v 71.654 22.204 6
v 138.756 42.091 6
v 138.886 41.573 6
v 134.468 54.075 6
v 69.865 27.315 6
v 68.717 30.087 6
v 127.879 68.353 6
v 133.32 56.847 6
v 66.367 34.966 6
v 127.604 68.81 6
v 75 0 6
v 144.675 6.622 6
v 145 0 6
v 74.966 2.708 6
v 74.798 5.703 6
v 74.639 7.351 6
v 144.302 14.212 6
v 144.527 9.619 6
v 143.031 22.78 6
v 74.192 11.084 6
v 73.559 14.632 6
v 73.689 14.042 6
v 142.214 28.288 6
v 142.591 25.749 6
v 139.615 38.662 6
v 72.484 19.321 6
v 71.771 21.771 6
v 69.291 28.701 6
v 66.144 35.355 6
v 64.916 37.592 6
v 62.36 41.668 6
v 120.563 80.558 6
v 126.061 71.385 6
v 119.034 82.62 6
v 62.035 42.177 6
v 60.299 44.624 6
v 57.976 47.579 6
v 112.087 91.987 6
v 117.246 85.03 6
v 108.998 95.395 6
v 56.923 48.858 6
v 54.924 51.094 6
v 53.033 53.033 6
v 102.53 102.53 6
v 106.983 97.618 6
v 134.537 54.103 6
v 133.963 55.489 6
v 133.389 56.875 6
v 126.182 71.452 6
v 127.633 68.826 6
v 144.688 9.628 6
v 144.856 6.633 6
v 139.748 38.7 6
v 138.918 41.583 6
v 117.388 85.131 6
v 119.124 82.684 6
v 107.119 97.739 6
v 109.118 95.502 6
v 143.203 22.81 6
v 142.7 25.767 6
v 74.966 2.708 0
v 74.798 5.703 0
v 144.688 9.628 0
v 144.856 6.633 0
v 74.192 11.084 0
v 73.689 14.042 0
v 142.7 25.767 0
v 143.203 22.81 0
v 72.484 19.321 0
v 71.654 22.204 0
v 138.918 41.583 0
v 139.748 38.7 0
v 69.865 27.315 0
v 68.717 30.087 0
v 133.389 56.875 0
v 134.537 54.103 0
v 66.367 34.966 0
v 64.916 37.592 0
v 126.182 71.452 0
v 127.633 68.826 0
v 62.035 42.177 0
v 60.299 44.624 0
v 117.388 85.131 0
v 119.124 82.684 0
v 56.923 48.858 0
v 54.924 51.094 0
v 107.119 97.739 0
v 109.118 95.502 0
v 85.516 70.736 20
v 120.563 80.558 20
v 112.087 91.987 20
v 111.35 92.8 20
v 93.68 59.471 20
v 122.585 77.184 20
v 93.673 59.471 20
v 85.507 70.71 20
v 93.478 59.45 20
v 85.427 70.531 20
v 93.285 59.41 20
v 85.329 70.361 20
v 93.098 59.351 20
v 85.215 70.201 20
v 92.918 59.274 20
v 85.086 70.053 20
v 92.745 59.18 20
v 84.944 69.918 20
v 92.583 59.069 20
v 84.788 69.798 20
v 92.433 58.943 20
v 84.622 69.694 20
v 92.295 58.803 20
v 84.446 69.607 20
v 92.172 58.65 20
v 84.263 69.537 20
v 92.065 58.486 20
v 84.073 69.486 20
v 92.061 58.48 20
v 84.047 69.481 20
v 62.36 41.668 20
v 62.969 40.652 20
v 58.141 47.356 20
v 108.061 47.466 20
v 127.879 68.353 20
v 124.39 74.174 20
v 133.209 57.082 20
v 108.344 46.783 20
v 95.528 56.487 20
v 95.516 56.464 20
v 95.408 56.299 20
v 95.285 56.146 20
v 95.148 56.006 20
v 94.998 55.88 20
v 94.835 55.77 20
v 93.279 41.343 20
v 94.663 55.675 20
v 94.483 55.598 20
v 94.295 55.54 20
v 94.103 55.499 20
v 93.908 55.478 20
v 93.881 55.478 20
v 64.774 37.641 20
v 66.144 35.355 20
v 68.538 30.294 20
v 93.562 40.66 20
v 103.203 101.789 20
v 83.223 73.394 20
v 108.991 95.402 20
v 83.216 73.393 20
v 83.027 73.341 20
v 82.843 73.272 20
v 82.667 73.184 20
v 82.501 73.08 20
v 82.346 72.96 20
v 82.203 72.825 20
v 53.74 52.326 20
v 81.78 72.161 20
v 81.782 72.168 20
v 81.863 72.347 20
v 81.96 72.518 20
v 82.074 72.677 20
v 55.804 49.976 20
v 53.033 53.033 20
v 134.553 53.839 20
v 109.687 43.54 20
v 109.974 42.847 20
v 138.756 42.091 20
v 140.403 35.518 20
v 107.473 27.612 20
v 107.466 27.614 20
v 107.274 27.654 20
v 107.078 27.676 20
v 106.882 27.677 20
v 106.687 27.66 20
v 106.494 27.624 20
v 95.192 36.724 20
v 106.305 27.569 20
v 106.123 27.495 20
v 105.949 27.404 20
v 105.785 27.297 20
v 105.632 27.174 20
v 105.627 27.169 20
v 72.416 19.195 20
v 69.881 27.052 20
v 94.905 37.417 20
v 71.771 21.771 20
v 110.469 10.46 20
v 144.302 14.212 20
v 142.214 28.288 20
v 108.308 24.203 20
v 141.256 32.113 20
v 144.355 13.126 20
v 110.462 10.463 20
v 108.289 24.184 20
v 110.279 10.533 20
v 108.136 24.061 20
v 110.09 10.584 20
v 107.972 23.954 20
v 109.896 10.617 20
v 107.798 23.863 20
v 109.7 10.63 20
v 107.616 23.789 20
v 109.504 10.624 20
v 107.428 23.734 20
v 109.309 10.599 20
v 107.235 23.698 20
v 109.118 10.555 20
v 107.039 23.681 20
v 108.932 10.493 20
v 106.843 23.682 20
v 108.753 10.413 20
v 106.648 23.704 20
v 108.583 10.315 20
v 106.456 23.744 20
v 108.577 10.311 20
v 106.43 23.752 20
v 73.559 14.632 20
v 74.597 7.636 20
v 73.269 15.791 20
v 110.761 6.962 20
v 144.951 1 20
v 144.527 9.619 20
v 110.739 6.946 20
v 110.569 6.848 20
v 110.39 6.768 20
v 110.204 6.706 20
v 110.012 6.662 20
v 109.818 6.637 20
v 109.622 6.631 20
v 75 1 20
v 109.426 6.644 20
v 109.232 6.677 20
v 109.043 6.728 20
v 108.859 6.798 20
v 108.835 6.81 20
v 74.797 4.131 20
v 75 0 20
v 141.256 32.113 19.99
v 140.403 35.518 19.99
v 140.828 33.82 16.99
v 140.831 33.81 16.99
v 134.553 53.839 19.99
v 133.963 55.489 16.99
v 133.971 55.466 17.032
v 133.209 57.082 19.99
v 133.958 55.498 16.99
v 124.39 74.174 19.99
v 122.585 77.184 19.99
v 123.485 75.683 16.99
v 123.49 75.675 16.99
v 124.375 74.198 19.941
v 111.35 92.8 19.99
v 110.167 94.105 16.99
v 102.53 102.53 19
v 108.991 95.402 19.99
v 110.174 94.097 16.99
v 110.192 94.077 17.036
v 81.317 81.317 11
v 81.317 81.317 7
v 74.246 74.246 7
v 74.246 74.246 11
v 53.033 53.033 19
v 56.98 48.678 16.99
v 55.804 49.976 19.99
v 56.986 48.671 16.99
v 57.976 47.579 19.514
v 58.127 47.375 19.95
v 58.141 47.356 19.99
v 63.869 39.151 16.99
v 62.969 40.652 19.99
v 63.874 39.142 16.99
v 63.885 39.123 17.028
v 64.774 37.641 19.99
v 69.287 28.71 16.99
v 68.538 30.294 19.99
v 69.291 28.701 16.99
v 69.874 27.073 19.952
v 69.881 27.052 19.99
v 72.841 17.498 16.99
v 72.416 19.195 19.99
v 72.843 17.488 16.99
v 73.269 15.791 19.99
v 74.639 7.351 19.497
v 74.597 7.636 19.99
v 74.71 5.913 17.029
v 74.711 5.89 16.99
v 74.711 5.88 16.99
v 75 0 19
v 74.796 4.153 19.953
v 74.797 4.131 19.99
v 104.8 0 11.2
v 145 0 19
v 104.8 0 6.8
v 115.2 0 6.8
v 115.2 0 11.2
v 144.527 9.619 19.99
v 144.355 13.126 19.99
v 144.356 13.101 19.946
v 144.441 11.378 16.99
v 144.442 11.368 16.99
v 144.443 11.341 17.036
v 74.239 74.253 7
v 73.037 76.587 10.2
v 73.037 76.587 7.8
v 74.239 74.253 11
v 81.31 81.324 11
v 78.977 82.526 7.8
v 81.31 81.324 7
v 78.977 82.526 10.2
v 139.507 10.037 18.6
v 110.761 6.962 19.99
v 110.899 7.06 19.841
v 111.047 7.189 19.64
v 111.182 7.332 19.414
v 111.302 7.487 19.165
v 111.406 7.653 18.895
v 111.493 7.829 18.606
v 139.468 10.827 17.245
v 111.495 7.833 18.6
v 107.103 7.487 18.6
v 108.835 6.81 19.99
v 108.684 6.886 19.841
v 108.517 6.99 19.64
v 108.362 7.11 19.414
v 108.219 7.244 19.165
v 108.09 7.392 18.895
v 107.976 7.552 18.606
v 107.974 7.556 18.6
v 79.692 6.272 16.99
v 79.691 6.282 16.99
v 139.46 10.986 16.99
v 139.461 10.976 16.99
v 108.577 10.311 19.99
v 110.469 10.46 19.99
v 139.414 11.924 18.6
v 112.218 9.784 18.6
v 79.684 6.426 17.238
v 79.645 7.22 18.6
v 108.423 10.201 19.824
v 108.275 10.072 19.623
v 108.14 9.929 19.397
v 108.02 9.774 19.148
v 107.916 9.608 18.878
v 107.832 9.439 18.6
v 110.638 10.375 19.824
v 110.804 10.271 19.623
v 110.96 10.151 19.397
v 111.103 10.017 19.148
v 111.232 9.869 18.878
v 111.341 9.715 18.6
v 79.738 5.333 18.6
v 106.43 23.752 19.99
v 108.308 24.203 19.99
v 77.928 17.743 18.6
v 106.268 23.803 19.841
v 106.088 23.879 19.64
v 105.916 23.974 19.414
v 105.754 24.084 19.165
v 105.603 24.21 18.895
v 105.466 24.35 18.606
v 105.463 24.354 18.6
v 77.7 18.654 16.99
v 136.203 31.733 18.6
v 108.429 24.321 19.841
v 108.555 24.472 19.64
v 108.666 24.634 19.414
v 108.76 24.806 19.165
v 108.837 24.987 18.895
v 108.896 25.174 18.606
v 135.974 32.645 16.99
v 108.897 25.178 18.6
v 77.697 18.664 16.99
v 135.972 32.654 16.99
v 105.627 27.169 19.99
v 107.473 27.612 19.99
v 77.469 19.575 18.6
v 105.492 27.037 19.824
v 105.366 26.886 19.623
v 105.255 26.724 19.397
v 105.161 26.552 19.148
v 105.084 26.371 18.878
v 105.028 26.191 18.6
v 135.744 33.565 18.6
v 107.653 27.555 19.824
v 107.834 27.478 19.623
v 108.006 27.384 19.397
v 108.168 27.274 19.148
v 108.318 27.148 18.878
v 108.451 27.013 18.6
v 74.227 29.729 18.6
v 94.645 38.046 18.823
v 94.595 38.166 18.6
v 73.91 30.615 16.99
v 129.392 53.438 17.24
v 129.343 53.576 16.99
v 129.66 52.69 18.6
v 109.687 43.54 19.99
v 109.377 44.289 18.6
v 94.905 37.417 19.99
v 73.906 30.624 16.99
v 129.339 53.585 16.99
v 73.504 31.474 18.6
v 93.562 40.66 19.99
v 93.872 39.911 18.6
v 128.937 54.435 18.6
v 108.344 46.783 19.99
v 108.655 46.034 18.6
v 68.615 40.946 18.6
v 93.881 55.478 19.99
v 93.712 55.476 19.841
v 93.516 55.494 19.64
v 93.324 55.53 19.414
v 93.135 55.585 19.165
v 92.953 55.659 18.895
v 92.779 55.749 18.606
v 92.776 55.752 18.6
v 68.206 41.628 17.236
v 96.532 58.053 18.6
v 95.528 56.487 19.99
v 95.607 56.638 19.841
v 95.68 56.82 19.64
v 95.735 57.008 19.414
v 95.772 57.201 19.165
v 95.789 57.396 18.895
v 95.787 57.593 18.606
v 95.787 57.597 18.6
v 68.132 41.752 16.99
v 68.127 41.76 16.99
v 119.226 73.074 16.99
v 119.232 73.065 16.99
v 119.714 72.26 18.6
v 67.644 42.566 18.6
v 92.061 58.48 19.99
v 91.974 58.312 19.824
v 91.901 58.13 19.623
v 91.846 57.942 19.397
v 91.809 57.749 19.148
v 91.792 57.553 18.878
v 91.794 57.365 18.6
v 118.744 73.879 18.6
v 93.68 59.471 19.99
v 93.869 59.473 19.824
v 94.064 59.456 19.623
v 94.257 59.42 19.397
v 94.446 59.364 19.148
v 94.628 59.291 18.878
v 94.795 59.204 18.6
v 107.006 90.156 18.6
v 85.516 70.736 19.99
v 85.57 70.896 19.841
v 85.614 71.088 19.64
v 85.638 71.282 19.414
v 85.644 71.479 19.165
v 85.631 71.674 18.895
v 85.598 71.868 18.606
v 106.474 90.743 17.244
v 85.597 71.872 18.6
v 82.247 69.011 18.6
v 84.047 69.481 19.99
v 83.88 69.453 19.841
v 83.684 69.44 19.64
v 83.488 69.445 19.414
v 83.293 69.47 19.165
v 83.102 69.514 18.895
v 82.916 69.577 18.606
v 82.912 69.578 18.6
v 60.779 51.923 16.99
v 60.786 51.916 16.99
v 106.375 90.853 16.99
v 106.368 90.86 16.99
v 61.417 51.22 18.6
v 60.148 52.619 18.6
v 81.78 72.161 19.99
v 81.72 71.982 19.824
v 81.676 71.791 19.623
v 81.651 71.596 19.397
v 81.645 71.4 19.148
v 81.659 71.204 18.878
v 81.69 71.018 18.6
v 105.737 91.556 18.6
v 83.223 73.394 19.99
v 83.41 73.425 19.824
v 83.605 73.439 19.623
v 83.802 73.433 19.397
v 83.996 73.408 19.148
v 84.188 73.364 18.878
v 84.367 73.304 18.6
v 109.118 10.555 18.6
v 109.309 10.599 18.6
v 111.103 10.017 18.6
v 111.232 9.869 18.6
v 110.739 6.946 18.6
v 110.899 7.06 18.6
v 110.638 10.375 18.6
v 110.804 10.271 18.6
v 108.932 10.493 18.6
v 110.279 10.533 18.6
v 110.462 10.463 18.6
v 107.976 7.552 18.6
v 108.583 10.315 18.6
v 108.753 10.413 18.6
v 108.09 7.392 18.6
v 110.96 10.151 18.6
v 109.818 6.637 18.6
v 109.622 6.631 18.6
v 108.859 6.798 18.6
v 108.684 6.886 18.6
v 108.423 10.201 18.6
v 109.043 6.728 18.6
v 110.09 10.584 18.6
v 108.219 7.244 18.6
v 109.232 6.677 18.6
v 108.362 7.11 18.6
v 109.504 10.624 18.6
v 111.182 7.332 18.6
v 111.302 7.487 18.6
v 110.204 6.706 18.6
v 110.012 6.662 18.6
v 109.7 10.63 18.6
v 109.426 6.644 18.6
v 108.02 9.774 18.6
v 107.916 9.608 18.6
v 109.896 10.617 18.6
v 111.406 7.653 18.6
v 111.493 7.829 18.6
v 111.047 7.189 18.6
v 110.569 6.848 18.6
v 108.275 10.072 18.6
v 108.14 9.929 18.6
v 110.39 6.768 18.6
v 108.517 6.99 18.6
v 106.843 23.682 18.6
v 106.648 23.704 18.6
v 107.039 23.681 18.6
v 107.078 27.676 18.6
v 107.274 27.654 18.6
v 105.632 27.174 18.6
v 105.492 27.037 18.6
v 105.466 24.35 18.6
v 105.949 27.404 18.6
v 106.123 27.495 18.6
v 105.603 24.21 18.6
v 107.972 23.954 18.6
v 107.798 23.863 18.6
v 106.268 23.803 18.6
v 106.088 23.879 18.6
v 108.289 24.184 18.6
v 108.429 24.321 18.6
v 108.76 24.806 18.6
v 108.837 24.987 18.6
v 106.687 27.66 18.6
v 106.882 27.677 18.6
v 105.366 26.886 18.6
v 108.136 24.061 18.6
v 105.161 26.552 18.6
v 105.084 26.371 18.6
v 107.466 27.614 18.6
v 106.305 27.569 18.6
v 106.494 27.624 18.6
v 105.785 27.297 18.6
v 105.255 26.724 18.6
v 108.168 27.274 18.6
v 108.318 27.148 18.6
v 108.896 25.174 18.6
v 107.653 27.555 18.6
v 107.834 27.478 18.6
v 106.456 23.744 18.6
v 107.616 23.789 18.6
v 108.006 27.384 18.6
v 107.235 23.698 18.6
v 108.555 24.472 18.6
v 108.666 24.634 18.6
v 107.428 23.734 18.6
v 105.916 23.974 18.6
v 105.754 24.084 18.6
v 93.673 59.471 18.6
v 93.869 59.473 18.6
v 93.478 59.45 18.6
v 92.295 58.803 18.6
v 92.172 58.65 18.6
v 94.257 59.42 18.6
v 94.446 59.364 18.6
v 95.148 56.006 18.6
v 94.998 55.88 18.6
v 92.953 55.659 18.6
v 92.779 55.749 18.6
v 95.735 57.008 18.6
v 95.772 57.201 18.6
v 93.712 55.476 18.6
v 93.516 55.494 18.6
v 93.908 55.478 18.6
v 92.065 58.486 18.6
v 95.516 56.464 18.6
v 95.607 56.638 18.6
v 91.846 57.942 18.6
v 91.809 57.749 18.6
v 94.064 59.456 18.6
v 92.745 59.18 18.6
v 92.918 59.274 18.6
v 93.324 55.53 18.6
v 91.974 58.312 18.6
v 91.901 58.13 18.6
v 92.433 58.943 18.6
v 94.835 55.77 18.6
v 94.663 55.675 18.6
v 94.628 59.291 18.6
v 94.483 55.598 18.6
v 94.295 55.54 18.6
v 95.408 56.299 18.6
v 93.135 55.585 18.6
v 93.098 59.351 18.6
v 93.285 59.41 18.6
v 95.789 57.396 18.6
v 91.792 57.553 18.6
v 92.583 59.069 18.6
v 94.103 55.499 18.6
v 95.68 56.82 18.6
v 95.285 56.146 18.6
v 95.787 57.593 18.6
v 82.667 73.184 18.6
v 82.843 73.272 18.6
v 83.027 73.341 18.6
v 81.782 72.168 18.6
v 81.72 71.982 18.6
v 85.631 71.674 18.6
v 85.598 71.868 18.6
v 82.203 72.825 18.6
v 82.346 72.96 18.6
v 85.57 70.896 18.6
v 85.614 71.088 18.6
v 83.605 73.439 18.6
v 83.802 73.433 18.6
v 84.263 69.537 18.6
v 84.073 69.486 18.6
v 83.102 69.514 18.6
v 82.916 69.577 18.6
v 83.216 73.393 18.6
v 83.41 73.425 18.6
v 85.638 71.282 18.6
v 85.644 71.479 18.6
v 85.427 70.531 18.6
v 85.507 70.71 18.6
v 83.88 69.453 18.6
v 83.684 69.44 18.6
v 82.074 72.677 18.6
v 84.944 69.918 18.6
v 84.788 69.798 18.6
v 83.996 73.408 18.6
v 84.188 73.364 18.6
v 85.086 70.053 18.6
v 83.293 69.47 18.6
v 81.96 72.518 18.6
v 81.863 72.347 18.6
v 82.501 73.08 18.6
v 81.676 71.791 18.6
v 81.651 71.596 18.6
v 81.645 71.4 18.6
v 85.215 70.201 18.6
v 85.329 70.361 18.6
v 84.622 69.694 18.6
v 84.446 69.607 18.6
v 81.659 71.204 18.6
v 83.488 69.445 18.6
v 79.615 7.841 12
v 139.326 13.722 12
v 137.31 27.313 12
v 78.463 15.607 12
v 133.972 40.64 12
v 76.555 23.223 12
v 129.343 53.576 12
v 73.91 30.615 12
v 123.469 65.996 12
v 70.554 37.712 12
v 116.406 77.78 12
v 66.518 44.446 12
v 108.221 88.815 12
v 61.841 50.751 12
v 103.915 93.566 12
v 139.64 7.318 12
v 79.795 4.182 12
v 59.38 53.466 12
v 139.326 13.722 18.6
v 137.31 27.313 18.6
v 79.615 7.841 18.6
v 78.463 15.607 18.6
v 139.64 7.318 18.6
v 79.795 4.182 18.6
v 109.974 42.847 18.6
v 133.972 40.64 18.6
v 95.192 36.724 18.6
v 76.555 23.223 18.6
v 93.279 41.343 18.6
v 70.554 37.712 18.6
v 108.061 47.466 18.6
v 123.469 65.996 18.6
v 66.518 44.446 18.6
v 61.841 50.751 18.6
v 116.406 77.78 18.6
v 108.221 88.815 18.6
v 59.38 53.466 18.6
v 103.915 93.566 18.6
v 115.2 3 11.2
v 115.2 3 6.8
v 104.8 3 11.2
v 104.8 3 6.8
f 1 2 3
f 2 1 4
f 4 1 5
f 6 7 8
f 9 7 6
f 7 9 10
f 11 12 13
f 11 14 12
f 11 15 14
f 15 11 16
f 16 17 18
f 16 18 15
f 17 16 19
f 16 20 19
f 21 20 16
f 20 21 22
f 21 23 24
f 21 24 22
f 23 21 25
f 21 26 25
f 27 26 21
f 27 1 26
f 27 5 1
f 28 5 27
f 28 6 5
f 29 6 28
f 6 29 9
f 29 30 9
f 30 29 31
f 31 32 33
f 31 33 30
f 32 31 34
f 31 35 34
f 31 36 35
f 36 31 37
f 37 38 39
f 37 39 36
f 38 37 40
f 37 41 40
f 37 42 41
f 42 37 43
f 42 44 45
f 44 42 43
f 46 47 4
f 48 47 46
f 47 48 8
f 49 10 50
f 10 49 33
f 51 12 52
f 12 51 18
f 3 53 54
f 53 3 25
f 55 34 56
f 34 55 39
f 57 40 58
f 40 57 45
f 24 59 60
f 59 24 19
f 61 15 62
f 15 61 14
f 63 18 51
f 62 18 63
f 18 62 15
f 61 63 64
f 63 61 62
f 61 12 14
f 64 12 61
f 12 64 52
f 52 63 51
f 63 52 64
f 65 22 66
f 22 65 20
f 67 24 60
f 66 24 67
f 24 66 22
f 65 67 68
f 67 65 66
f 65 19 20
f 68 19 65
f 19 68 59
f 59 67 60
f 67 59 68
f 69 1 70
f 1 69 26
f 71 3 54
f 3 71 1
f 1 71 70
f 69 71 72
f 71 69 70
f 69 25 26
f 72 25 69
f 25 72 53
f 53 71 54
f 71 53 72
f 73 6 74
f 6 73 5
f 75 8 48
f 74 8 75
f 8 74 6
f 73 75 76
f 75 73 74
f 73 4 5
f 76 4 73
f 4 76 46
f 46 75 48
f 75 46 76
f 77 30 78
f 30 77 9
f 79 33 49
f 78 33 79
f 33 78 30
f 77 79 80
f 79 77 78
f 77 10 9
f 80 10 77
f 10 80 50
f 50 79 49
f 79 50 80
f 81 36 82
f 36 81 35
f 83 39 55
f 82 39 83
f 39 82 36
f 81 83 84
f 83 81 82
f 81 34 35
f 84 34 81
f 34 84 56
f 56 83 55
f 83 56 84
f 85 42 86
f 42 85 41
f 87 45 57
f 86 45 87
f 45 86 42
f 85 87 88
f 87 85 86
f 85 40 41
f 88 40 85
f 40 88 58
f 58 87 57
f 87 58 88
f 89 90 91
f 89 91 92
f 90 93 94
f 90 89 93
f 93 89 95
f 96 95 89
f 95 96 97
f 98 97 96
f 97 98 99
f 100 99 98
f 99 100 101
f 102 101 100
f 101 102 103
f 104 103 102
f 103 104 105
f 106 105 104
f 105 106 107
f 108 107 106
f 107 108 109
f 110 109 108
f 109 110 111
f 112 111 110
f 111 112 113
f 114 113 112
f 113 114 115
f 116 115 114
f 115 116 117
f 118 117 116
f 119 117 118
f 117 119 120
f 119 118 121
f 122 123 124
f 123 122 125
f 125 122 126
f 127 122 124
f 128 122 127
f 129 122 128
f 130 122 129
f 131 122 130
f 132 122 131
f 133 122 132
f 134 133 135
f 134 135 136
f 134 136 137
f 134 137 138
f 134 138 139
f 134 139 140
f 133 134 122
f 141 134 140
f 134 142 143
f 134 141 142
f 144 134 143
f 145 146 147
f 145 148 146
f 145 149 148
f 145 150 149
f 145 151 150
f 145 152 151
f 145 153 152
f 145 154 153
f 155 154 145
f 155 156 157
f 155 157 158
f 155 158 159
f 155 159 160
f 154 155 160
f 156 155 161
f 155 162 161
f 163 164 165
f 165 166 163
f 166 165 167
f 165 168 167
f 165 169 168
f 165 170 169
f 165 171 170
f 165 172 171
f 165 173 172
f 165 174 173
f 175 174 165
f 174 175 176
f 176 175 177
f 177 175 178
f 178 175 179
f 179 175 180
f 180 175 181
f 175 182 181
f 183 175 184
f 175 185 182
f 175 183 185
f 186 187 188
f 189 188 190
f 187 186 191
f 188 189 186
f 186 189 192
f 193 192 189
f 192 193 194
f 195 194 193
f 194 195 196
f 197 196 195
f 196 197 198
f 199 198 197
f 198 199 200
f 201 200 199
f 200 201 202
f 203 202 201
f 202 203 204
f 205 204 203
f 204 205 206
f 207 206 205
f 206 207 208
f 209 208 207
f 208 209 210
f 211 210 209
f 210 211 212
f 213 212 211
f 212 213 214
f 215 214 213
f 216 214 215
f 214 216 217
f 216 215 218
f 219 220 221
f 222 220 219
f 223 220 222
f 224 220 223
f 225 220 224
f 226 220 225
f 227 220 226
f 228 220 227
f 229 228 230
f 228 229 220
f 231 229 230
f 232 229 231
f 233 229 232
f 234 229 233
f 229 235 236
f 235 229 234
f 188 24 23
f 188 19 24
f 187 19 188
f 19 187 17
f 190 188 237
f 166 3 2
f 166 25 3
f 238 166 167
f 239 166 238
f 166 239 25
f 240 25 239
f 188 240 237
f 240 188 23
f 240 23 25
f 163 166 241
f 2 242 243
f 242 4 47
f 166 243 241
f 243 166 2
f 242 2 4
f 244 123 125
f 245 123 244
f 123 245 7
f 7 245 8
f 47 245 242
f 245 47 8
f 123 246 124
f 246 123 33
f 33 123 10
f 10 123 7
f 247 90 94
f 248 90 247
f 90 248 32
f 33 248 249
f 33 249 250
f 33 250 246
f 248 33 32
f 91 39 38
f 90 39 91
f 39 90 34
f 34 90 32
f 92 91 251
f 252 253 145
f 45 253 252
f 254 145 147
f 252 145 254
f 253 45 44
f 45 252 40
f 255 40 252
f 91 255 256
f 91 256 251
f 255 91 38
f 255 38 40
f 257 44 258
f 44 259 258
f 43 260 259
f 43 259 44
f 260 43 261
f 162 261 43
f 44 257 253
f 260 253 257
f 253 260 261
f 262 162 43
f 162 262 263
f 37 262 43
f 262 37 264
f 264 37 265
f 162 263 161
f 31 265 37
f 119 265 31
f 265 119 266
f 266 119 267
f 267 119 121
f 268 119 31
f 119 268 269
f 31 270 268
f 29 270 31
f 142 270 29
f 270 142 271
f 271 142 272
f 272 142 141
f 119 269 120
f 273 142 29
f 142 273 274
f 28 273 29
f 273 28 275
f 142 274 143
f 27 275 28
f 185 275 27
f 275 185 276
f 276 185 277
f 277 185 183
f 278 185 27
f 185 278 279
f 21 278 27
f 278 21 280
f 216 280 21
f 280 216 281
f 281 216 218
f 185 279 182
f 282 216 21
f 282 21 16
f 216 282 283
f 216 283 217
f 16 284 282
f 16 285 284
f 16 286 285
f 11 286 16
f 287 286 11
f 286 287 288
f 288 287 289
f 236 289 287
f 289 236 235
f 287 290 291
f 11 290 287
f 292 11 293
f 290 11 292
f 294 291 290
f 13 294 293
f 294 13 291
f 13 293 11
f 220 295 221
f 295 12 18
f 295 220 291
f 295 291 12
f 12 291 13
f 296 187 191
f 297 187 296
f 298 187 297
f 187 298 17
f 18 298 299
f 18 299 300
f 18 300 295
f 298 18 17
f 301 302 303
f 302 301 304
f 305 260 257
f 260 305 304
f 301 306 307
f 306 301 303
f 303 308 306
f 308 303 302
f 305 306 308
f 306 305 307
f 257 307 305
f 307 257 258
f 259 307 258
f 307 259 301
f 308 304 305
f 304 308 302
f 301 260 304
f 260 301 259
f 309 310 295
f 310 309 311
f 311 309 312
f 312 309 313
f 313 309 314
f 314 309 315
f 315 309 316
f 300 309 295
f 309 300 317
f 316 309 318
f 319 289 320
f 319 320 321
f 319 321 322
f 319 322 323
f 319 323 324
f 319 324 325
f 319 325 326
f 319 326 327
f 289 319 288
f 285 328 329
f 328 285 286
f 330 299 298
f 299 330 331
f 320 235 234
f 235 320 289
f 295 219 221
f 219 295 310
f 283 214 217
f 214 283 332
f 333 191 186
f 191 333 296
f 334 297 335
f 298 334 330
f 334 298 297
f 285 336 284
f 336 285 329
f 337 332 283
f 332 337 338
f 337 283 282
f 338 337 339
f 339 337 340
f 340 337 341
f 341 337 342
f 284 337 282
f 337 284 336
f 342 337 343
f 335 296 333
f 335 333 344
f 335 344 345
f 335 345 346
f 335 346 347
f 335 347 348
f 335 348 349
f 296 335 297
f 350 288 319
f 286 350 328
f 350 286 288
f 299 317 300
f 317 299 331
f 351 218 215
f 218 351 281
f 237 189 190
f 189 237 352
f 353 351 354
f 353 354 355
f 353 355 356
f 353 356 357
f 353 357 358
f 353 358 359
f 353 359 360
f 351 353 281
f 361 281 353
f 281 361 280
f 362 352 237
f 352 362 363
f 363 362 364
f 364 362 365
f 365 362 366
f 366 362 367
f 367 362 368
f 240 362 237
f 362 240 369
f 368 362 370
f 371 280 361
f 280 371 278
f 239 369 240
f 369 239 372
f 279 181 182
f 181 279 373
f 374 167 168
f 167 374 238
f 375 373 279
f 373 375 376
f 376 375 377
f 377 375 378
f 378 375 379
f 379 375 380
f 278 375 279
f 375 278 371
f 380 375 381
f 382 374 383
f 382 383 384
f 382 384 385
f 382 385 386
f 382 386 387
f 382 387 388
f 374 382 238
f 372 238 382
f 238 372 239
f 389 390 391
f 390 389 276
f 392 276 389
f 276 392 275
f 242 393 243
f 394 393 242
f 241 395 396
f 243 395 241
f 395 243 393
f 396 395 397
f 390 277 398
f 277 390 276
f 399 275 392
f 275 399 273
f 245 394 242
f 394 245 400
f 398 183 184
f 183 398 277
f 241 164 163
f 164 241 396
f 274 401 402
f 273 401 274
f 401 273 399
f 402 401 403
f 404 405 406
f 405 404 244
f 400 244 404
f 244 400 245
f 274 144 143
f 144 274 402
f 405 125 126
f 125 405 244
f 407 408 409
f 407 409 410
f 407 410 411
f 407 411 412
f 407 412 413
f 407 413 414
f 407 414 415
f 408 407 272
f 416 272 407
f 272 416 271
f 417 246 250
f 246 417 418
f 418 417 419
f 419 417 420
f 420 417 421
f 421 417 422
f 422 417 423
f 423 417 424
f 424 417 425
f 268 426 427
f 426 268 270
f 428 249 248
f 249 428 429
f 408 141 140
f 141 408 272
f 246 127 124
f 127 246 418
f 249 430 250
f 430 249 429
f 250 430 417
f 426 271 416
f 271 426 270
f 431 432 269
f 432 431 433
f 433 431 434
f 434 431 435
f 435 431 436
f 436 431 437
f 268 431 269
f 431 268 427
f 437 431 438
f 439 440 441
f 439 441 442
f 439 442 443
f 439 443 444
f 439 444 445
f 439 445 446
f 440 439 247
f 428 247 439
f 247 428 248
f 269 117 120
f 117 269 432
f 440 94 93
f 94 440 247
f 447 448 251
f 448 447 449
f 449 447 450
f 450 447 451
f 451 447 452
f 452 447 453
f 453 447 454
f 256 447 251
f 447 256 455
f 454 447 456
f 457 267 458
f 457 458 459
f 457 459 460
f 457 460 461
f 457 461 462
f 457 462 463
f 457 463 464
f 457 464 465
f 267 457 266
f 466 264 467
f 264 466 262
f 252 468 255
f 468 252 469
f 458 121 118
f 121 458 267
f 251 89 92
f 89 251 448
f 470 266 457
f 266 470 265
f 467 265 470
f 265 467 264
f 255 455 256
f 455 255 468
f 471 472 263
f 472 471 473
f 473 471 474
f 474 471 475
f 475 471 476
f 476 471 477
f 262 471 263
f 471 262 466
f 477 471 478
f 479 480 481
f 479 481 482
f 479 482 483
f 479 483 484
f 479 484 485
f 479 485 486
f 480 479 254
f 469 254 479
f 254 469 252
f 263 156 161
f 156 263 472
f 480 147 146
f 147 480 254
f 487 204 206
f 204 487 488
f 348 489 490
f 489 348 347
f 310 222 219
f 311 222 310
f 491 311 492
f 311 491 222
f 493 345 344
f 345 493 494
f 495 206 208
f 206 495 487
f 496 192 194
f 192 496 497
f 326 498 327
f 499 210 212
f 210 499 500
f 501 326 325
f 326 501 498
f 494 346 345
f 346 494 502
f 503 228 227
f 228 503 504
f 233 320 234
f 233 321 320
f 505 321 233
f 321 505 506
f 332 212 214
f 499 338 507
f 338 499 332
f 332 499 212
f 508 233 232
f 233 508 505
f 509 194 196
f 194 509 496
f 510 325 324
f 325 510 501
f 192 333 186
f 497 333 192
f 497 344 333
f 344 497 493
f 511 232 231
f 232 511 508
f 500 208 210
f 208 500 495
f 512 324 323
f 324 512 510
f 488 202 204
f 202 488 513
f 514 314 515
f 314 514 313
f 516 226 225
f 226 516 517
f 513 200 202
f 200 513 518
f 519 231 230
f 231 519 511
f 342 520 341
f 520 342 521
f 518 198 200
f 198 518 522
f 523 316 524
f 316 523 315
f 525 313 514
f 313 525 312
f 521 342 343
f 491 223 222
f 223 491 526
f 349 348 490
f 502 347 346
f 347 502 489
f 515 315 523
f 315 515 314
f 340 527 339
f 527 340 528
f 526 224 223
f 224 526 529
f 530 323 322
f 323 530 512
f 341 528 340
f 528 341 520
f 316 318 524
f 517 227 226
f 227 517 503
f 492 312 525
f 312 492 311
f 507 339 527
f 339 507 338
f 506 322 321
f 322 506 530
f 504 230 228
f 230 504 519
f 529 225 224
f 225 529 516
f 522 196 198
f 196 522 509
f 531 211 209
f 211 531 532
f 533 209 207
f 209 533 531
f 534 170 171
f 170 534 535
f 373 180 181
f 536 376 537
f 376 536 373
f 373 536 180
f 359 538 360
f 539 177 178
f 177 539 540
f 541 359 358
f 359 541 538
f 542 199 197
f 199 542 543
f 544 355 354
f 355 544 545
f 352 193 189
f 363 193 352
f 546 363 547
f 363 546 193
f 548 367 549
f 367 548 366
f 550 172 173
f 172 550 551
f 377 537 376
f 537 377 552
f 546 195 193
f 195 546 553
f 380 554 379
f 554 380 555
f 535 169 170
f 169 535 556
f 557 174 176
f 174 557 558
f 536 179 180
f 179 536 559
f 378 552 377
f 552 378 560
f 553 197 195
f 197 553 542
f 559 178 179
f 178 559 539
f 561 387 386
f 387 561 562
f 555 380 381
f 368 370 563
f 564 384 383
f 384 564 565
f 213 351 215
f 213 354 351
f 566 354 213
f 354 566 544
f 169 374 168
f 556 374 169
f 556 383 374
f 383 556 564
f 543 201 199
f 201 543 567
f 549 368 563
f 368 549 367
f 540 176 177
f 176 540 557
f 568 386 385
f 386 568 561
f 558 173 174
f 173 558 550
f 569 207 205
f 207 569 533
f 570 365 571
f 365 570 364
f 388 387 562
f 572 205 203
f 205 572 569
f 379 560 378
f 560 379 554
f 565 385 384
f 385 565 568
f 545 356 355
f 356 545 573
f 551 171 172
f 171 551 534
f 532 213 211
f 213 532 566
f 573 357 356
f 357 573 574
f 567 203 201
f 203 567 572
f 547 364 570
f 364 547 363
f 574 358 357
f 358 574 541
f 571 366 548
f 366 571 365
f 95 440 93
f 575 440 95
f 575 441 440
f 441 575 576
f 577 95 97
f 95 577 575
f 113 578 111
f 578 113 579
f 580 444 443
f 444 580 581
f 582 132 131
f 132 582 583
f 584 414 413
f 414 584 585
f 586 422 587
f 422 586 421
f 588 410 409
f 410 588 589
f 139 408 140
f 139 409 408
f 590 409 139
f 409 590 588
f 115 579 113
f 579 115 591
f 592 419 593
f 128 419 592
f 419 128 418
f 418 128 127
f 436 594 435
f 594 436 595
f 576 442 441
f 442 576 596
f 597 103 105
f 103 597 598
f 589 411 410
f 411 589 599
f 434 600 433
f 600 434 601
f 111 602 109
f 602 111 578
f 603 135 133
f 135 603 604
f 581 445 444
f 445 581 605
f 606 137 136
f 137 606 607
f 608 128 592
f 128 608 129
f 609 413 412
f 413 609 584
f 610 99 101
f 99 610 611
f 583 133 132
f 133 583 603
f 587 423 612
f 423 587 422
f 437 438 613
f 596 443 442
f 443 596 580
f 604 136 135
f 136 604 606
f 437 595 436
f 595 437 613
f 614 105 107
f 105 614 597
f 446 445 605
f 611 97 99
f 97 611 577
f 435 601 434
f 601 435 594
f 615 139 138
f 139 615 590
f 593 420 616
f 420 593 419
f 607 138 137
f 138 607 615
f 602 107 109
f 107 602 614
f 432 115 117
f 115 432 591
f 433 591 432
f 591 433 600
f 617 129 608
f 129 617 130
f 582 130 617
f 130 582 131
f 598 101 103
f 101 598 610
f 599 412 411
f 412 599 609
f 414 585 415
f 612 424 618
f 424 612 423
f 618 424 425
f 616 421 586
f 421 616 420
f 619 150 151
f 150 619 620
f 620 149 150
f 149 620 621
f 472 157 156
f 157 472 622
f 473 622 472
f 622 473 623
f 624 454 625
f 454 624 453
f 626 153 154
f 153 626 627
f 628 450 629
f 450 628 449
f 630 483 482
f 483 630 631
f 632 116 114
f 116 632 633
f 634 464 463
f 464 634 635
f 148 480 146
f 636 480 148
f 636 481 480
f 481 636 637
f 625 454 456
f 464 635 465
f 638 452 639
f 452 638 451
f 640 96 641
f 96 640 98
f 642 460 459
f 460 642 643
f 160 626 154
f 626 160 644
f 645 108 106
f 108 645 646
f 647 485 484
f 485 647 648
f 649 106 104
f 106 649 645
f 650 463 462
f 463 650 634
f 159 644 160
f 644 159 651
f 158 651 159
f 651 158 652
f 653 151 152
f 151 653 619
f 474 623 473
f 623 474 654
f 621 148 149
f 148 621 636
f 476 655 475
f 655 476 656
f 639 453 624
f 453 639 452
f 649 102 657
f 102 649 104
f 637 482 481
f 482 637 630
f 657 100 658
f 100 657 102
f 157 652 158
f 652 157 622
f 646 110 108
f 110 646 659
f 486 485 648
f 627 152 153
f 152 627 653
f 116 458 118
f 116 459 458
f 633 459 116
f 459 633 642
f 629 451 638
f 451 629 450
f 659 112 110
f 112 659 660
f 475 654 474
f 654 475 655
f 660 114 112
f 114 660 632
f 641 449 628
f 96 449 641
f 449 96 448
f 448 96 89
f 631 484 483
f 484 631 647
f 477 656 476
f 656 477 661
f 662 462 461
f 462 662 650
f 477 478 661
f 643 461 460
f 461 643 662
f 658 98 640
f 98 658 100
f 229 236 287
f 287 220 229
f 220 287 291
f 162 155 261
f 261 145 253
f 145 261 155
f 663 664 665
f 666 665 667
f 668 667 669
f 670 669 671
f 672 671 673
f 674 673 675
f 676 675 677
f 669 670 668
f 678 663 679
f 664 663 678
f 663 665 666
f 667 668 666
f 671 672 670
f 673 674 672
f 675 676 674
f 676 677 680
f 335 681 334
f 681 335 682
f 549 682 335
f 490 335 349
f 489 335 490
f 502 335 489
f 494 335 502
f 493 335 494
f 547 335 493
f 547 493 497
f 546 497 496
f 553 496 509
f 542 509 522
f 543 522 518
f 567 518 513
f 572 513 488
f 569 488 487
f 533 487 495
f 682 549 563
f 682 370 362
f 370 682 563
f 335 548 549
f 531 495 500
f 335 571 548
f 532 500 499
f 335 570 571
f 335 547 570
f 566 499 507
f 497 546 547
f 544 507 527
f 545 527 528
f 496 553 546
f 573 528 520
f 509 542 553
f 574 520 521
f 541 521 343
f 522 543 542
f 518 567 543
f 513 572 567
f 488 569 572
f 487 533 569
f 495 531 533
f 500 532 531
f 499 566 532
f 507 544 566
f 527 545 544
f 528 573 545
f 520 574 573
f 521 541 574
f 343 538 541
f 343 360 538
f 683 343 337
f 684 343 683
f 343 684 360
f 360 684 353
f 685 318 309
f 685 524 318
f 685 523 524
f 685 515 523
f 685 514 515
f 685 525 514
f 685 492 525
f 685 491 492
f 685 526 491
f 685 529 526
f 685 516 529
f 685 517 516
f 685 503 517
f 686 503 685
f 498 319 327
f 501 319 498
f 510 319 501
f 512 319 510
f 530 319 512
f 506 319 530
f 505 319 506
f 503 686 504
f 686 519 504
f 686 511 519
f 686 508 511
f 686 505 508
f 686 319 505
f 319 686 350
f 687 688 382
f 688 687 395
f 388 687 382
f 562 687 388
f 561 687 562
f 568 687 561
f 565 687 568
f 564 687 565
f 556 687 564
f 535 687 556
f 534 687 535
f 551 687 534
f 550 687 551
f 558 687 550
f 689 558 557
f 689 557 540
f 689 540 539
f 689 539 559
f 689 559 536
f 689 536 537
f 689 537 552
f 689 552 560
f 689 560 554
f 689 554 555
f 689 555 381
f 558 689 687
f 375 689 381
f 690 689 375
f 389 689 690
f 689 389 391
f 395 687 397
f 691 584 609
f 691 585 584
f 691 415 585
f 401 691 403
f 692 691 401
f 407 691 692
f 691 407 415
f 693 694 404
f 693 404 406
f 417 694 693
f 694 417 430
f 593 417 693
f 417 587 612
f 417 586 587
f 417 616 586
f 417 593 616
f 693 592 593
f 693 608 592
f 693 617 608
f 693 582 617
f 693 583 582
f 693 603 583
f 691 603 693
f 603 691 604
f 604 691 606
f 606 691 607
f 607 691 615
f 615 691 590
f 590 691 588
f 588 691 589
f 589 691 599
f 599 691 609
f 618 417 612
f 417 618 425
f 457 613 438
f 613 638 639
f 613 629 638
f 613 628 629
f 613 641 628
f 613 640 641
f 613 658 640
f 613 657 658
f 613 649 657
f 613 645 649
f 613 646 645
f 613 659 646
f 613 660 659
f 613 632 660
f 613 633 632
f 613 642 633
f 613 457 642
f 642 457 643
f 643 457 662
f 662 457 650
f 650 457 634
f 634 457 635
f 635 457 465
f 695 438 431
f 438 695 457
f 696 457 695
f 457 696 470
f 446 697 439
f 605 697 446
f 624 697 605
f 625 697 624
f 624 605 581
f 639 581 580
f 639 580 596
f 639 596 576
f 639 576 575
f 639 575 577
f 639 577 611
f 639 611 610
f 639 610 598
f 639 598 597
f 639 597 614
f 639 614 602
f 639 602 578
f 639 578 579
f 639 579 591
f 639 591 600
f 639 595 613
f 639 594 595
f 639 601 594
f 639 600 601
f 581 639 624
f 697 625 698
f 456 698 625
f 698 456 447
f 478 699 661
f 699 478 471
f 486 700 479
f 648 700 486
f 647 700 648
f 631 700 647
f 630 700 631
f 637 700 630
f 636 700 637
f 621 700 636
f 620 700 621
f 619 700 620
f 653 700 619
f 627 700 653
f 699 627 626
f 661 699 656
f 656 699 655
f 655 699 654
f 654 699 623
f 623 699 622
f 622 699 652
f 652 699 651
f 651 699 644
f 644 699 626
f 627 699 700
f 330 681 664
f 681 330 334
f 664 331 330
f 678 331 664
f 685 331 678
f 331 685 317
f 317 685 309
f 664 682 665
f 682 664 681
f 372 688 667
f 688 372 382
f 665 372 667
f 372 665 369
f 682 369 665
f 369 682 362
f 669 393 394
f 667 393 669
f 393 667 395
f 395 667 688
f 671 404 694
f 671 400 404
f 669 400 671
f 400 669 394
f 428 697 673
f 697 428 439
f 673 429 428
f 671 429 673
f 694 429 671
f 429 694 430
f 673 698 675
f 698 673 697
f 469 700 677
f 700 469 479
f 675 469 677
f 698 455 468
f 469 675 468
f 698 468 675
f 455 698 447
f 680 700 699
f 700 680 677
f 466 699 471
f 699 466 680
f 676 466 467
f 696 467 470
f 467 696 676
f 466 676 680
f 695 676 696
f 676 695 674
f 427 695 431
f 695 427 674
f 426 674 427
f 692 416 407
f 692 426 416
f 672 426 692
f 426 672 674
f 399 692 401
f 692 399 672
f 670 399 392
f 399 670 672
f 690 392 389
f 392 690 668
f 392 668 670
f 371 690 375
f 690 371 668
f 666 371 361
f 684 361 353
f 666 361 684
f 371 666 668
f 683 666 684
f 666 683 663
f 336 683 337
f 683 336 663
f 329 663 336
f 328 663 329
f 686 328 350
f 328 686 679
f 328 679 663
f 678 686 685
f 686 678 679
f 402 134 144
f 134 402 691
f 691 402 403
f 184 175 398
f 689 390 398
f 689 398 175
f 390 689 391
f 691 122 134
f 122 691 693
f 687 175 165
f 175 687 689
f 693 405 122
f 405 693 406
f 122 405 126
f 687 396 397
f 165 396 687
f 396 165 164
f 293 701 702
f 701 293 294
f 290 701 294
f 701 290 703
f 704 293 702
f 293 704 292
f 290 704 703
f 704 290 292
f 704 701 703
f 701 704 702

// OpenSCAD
// ═══════════════════════════════════════════════════════════════════════
//  CowPad — Arc Tile  ·  Demo Model  ·  1:8 Scale
//  ENGN676 Agricultural Engineering  ·  Lincoln University  ·  2026
//  Designer: Yu Zhou  ·  Supervisor: Majeed Safa
//
//  Real: 600mm pad width · 45° sector · 50mm thick (Hynds 1100L trough)
//  This: 70mm pad width  · 45° sector · 13mm thick + 4mm ribs = 17mm total
//
//  ► PRINT 2 COPIES of this file
//  ► Orientation : flat face DOWN (ribs stand on build plate)
//  ► Layer height : 0.2mm
//  ► Infill       : 20% gyroid
//  ► Supports     : NONE
//  ► Material     : PLA
//  ► Est. time    : ~2 hr per tile
//
//  SNAP CONNECTORS:
//    Each tile has a MALE TAB on its +45° radial edge
//    and a FEMALE SLOT on its 0° radial edge.
//    Press tiles together edge-to-edge → tab clicks into slot.
//    Pull apart to separate.
// ═══════════════════════════════════════════════════════════════════════

$fn = 64;

// ── Radii ────────────────────────────────────────────────────────────────
IR = 75;   // inner radius (trough side)
OR = 145;  // outer radius (field side)
ANG = 45;  // arc degrees per tile (8 tiles = full ring)

// ── Heights ──────────────────────────────────────────────────────────────
BASE_H = 6;   // solid structural base
FILL_H = 8;   // biochar fill cavity depth (increased to fit cartridge + spring)
H      = BASE_H + FILL_H;  // = 13mm above rib plane
RIB_H  = 4;   // ribs project down from base bottom

// ── Drainage channels (top surface, radial) ──────────────────────────────
// V-groove channels — 60° included angle, self-cleaning at low flow
// Research: V-profile maintains velocity as flow drops → flushes biochar fines
N_CH  = 5;    // number of radial V-grooves
CH_W  = 3.5;  // top opening width (mm) — 60° V: width = 2 × depth × tan(30°) ≈ 3.5mm
CH_D  = 3.0;  // groove depth (increased from 2.2 → better self-cleaning hydraulics)

// ── Top lid ──────────────────────────────────────────────────────────────
// Solid cover over cavity — cow hoof load bears on this (4–6mm for production)
// Drain holes pierced at channel centrelines
LID_H   = 1.5;  // demo: 1.5mm PLA | production: 4mm UV-HDPE
LID_D   = 4.0;  // drain hole diameter

// ── Edge chamfer (prevents hoof-catching at tile joints) ─────────────────
// Research: joint gap >3mm catches hooves; chamfer all top edges
CHAM  = 1.0;  // 1mm at 1:8 scale = 8mm real — standard for agricultural flooring

// ── Structural ribs (bottom) ─────────────────────────────────────────────
// Research: rib height 2.5–3× wall thickness reduces deflection ~90%
N_RIB = 7;    // was 5 — hoof point load distribution across 7 ribs
RIB_H = 6;    // was 4mm — taller ribs, better stiffness-to-weight
RIB_W = 3.0;  // was 2.5mm

// ── Biochar cavity ───────────────────────────────────────────────────────
CAV_WALL = 5;  // wall thickness around cavity
CAV_ANG  = 3;  // clearance from radial edges (degrees)

// ── Snap connector ───────────────────────────────────────────────────────
SN_W    = 10;  // tab width
SN_H    = 4;   // tab height in Z
SN_L    = 2.5; // protrusion length
SN_CHAM = 0.8; // chamfer on tab tip (guides engagement)
SN_POS  = (IR + OR) / 2;  // radial center of snap = 110mm

// ═══════════════════════════════════════════════════════════════════════
// HELPERS
// ═══════════════════════════════════════════════════════════════════════

module pie_2d(r, a1, a2) {
  steps = max(4, ceil(a2 - a1));
  pts = concat([[0, 0]],
    [for (i = [0:steps])
      [r * cos(a1 + i*(a2-a1)/steps),
       r * sin(a1 + i*(a2-a1)/steps)]]);
  polygon(pts);
}

module ring_sector_2d(ri, ro, a1, a2) {
  intersection() {
    difference() { circle(ro); circle(ri); }
    pie_2d(ro + 1, a1, a2);
  }
}

module ring_sector(ri, ro, a1, a2, h) {
  linear_extrude(h) ring_sector_2d(ri, ro, a1, a2);
}

// ═══════════════════════════════════════════════════════════════════════
// CONNECTORS
// ═══════════════════════════════════════════════════════════════════════

// Male tab — on +ANG edge, protrudes outward from tile
module snap_tab() {
  rotate([0, 0, ANG]) {
    // In this frame: ANG edge is along +X, tile interior is in -Y half.
    // Outward (+Y) = toward adjacent tile.
    translate([SN_POS - SN_W/2, 0, BASE_H/2 - SN_H/2])
      hull() {
        cube([SN_W, 0.01, SN_H]);
        translate([SN_CHAM, SN_L, SN_CHAM])
          cube([SN_W - 2*SN_CHAM, 0.01, SN_H - 2*SN_CHAM]);
      }
  }
}

// Female slot — cut into 0° edge, receives tab from adjacent tile
module snap_slot_cut() {
  // At 0° edge (along +X), tile interior is +Y. Slot opens at Y=0.
  translate([SN_POS - SN_W/2 - 0.2, 0, BASE_H/2 - SN_H/2 - 0.2])
    cube([SN_W + 0.4, SN_L + 0.5, SN_H + 0.4]);
}

// ═══════════════════════════════════════════════════════════════════════
// FEATURES
// ═══════════════════════════════════════════════════════════════════════

// V-groove radial channels — self-cleaning triangular cross-section
// hull() of 3 parallel lines creates a triangular prism (V-shape)
// Tip at depth CH_D below surface, opening CH_W wide at surface
module channel_cuts() {
  for (i = [0:N_CH-1]) {
    a = (i + 0.5) * ANG / N_CH;
    rotate([0, 0, a])
      translate([IR - 1, 0, H - CH_D - 0.01])
        hull() {
          cube([OR - IR + 2, 0.01, 0.01]);                         // V tip
          translate([0, -CH_W/2, CH_D]) cube([OR - IR + 2, 0.01, 0.01]); // left top
          translate([0,  CH_W/2, CH_D]) cube([OR - IR + 2, 0.01, 0.01]); // right top
        }
  }
}

// Edge chamfers — top corners of both radial faces
// Prevents hoof-catching at tile joints (research: >3mm gap = lameness risk)
module edge_chamfers() {
  for (a = [0, ANG]) {
    rotate([0, 0, a])
      translate([IR, 0, H - CHAM])
        rotate([45, 0, 0])
          cube([OR - IR, CHAM * 1.5, CHAM * 1.5]);
  }
}

// drain_slots() removed — replaced by lid_drain_holes() (circular, through lid only)

// Fill cavity — stops LID_H below top face (lid covers it)
module cavity_cut() {
  translate([0, 0, BASE_H])
    ring_sector(IR + CAV_WALL, OR - CAV_WALL,
                CAV_ANG, ANG - CAV_ANG,
                FILL_H - LID_H + 0.1);
}

// Pull-tab slot through lid — rectangular opening for cartridge pull tab (14×4mm)
// Without this the 14mm-wide tab would be blocked by the solid lid.
module pull_tab_slot() {
  rotate([0, 0, ANG / 2])
    translate([(IR + OR) / 2 - 8, -2.5, H - LID_H - 0.1])
      cube([16, 5, LID_H + 0.2]);   // 16mm radial × 5mm arc × through lid
}

// Drain holes through lid — one per channel, at mid-radius
// Urine sits in surface channel → flows into hole → drops to biochar
module lid_drain_holes() {
  R_MID = (IR + OR) / 2;
  for (i = [0:N_CH-1]) {
    a = (i + 0.5) * ANG / N_CH;
    rotate([0, 0, a])
      translate([R_MID, 0, H - LID_H - 0.1])
        cylinder(d = LID_D, h = LID_H + 0.2);
  }
}

// Structural ribs — project below base, stand on build plate when printing
module ribs() {
  for (i = [0:N_RIB-1]) {
    a = (i + 0.5) * ANG / N_RIB;
    rotate([0, 0, a])
      translate([IR, -RIB_W/2, -RIB_H])
        cube([OR - IR, RIB_W, RIB_H]);
  }
}

// ═══════════════════════════════════════════════════════════════════════
// ASSEMBLE
// Translate up by RIB_H so rib tips sit at Z=0 (on build plate)
// ═══════════════════════════════════════════════════════════════════════

translate([0, 0, RIB_H]) {
  difference() {
    union() {
      ring_sector(IR, OR, 0, ANG, H);
      ribs();
      snap_tab();
    }
    cavity_cut();
    channel_cuts();
    lid_drain_holes();
    pull_tab_slot();
    snap_slot_cut();
    edge_chamfers();
  }
}
